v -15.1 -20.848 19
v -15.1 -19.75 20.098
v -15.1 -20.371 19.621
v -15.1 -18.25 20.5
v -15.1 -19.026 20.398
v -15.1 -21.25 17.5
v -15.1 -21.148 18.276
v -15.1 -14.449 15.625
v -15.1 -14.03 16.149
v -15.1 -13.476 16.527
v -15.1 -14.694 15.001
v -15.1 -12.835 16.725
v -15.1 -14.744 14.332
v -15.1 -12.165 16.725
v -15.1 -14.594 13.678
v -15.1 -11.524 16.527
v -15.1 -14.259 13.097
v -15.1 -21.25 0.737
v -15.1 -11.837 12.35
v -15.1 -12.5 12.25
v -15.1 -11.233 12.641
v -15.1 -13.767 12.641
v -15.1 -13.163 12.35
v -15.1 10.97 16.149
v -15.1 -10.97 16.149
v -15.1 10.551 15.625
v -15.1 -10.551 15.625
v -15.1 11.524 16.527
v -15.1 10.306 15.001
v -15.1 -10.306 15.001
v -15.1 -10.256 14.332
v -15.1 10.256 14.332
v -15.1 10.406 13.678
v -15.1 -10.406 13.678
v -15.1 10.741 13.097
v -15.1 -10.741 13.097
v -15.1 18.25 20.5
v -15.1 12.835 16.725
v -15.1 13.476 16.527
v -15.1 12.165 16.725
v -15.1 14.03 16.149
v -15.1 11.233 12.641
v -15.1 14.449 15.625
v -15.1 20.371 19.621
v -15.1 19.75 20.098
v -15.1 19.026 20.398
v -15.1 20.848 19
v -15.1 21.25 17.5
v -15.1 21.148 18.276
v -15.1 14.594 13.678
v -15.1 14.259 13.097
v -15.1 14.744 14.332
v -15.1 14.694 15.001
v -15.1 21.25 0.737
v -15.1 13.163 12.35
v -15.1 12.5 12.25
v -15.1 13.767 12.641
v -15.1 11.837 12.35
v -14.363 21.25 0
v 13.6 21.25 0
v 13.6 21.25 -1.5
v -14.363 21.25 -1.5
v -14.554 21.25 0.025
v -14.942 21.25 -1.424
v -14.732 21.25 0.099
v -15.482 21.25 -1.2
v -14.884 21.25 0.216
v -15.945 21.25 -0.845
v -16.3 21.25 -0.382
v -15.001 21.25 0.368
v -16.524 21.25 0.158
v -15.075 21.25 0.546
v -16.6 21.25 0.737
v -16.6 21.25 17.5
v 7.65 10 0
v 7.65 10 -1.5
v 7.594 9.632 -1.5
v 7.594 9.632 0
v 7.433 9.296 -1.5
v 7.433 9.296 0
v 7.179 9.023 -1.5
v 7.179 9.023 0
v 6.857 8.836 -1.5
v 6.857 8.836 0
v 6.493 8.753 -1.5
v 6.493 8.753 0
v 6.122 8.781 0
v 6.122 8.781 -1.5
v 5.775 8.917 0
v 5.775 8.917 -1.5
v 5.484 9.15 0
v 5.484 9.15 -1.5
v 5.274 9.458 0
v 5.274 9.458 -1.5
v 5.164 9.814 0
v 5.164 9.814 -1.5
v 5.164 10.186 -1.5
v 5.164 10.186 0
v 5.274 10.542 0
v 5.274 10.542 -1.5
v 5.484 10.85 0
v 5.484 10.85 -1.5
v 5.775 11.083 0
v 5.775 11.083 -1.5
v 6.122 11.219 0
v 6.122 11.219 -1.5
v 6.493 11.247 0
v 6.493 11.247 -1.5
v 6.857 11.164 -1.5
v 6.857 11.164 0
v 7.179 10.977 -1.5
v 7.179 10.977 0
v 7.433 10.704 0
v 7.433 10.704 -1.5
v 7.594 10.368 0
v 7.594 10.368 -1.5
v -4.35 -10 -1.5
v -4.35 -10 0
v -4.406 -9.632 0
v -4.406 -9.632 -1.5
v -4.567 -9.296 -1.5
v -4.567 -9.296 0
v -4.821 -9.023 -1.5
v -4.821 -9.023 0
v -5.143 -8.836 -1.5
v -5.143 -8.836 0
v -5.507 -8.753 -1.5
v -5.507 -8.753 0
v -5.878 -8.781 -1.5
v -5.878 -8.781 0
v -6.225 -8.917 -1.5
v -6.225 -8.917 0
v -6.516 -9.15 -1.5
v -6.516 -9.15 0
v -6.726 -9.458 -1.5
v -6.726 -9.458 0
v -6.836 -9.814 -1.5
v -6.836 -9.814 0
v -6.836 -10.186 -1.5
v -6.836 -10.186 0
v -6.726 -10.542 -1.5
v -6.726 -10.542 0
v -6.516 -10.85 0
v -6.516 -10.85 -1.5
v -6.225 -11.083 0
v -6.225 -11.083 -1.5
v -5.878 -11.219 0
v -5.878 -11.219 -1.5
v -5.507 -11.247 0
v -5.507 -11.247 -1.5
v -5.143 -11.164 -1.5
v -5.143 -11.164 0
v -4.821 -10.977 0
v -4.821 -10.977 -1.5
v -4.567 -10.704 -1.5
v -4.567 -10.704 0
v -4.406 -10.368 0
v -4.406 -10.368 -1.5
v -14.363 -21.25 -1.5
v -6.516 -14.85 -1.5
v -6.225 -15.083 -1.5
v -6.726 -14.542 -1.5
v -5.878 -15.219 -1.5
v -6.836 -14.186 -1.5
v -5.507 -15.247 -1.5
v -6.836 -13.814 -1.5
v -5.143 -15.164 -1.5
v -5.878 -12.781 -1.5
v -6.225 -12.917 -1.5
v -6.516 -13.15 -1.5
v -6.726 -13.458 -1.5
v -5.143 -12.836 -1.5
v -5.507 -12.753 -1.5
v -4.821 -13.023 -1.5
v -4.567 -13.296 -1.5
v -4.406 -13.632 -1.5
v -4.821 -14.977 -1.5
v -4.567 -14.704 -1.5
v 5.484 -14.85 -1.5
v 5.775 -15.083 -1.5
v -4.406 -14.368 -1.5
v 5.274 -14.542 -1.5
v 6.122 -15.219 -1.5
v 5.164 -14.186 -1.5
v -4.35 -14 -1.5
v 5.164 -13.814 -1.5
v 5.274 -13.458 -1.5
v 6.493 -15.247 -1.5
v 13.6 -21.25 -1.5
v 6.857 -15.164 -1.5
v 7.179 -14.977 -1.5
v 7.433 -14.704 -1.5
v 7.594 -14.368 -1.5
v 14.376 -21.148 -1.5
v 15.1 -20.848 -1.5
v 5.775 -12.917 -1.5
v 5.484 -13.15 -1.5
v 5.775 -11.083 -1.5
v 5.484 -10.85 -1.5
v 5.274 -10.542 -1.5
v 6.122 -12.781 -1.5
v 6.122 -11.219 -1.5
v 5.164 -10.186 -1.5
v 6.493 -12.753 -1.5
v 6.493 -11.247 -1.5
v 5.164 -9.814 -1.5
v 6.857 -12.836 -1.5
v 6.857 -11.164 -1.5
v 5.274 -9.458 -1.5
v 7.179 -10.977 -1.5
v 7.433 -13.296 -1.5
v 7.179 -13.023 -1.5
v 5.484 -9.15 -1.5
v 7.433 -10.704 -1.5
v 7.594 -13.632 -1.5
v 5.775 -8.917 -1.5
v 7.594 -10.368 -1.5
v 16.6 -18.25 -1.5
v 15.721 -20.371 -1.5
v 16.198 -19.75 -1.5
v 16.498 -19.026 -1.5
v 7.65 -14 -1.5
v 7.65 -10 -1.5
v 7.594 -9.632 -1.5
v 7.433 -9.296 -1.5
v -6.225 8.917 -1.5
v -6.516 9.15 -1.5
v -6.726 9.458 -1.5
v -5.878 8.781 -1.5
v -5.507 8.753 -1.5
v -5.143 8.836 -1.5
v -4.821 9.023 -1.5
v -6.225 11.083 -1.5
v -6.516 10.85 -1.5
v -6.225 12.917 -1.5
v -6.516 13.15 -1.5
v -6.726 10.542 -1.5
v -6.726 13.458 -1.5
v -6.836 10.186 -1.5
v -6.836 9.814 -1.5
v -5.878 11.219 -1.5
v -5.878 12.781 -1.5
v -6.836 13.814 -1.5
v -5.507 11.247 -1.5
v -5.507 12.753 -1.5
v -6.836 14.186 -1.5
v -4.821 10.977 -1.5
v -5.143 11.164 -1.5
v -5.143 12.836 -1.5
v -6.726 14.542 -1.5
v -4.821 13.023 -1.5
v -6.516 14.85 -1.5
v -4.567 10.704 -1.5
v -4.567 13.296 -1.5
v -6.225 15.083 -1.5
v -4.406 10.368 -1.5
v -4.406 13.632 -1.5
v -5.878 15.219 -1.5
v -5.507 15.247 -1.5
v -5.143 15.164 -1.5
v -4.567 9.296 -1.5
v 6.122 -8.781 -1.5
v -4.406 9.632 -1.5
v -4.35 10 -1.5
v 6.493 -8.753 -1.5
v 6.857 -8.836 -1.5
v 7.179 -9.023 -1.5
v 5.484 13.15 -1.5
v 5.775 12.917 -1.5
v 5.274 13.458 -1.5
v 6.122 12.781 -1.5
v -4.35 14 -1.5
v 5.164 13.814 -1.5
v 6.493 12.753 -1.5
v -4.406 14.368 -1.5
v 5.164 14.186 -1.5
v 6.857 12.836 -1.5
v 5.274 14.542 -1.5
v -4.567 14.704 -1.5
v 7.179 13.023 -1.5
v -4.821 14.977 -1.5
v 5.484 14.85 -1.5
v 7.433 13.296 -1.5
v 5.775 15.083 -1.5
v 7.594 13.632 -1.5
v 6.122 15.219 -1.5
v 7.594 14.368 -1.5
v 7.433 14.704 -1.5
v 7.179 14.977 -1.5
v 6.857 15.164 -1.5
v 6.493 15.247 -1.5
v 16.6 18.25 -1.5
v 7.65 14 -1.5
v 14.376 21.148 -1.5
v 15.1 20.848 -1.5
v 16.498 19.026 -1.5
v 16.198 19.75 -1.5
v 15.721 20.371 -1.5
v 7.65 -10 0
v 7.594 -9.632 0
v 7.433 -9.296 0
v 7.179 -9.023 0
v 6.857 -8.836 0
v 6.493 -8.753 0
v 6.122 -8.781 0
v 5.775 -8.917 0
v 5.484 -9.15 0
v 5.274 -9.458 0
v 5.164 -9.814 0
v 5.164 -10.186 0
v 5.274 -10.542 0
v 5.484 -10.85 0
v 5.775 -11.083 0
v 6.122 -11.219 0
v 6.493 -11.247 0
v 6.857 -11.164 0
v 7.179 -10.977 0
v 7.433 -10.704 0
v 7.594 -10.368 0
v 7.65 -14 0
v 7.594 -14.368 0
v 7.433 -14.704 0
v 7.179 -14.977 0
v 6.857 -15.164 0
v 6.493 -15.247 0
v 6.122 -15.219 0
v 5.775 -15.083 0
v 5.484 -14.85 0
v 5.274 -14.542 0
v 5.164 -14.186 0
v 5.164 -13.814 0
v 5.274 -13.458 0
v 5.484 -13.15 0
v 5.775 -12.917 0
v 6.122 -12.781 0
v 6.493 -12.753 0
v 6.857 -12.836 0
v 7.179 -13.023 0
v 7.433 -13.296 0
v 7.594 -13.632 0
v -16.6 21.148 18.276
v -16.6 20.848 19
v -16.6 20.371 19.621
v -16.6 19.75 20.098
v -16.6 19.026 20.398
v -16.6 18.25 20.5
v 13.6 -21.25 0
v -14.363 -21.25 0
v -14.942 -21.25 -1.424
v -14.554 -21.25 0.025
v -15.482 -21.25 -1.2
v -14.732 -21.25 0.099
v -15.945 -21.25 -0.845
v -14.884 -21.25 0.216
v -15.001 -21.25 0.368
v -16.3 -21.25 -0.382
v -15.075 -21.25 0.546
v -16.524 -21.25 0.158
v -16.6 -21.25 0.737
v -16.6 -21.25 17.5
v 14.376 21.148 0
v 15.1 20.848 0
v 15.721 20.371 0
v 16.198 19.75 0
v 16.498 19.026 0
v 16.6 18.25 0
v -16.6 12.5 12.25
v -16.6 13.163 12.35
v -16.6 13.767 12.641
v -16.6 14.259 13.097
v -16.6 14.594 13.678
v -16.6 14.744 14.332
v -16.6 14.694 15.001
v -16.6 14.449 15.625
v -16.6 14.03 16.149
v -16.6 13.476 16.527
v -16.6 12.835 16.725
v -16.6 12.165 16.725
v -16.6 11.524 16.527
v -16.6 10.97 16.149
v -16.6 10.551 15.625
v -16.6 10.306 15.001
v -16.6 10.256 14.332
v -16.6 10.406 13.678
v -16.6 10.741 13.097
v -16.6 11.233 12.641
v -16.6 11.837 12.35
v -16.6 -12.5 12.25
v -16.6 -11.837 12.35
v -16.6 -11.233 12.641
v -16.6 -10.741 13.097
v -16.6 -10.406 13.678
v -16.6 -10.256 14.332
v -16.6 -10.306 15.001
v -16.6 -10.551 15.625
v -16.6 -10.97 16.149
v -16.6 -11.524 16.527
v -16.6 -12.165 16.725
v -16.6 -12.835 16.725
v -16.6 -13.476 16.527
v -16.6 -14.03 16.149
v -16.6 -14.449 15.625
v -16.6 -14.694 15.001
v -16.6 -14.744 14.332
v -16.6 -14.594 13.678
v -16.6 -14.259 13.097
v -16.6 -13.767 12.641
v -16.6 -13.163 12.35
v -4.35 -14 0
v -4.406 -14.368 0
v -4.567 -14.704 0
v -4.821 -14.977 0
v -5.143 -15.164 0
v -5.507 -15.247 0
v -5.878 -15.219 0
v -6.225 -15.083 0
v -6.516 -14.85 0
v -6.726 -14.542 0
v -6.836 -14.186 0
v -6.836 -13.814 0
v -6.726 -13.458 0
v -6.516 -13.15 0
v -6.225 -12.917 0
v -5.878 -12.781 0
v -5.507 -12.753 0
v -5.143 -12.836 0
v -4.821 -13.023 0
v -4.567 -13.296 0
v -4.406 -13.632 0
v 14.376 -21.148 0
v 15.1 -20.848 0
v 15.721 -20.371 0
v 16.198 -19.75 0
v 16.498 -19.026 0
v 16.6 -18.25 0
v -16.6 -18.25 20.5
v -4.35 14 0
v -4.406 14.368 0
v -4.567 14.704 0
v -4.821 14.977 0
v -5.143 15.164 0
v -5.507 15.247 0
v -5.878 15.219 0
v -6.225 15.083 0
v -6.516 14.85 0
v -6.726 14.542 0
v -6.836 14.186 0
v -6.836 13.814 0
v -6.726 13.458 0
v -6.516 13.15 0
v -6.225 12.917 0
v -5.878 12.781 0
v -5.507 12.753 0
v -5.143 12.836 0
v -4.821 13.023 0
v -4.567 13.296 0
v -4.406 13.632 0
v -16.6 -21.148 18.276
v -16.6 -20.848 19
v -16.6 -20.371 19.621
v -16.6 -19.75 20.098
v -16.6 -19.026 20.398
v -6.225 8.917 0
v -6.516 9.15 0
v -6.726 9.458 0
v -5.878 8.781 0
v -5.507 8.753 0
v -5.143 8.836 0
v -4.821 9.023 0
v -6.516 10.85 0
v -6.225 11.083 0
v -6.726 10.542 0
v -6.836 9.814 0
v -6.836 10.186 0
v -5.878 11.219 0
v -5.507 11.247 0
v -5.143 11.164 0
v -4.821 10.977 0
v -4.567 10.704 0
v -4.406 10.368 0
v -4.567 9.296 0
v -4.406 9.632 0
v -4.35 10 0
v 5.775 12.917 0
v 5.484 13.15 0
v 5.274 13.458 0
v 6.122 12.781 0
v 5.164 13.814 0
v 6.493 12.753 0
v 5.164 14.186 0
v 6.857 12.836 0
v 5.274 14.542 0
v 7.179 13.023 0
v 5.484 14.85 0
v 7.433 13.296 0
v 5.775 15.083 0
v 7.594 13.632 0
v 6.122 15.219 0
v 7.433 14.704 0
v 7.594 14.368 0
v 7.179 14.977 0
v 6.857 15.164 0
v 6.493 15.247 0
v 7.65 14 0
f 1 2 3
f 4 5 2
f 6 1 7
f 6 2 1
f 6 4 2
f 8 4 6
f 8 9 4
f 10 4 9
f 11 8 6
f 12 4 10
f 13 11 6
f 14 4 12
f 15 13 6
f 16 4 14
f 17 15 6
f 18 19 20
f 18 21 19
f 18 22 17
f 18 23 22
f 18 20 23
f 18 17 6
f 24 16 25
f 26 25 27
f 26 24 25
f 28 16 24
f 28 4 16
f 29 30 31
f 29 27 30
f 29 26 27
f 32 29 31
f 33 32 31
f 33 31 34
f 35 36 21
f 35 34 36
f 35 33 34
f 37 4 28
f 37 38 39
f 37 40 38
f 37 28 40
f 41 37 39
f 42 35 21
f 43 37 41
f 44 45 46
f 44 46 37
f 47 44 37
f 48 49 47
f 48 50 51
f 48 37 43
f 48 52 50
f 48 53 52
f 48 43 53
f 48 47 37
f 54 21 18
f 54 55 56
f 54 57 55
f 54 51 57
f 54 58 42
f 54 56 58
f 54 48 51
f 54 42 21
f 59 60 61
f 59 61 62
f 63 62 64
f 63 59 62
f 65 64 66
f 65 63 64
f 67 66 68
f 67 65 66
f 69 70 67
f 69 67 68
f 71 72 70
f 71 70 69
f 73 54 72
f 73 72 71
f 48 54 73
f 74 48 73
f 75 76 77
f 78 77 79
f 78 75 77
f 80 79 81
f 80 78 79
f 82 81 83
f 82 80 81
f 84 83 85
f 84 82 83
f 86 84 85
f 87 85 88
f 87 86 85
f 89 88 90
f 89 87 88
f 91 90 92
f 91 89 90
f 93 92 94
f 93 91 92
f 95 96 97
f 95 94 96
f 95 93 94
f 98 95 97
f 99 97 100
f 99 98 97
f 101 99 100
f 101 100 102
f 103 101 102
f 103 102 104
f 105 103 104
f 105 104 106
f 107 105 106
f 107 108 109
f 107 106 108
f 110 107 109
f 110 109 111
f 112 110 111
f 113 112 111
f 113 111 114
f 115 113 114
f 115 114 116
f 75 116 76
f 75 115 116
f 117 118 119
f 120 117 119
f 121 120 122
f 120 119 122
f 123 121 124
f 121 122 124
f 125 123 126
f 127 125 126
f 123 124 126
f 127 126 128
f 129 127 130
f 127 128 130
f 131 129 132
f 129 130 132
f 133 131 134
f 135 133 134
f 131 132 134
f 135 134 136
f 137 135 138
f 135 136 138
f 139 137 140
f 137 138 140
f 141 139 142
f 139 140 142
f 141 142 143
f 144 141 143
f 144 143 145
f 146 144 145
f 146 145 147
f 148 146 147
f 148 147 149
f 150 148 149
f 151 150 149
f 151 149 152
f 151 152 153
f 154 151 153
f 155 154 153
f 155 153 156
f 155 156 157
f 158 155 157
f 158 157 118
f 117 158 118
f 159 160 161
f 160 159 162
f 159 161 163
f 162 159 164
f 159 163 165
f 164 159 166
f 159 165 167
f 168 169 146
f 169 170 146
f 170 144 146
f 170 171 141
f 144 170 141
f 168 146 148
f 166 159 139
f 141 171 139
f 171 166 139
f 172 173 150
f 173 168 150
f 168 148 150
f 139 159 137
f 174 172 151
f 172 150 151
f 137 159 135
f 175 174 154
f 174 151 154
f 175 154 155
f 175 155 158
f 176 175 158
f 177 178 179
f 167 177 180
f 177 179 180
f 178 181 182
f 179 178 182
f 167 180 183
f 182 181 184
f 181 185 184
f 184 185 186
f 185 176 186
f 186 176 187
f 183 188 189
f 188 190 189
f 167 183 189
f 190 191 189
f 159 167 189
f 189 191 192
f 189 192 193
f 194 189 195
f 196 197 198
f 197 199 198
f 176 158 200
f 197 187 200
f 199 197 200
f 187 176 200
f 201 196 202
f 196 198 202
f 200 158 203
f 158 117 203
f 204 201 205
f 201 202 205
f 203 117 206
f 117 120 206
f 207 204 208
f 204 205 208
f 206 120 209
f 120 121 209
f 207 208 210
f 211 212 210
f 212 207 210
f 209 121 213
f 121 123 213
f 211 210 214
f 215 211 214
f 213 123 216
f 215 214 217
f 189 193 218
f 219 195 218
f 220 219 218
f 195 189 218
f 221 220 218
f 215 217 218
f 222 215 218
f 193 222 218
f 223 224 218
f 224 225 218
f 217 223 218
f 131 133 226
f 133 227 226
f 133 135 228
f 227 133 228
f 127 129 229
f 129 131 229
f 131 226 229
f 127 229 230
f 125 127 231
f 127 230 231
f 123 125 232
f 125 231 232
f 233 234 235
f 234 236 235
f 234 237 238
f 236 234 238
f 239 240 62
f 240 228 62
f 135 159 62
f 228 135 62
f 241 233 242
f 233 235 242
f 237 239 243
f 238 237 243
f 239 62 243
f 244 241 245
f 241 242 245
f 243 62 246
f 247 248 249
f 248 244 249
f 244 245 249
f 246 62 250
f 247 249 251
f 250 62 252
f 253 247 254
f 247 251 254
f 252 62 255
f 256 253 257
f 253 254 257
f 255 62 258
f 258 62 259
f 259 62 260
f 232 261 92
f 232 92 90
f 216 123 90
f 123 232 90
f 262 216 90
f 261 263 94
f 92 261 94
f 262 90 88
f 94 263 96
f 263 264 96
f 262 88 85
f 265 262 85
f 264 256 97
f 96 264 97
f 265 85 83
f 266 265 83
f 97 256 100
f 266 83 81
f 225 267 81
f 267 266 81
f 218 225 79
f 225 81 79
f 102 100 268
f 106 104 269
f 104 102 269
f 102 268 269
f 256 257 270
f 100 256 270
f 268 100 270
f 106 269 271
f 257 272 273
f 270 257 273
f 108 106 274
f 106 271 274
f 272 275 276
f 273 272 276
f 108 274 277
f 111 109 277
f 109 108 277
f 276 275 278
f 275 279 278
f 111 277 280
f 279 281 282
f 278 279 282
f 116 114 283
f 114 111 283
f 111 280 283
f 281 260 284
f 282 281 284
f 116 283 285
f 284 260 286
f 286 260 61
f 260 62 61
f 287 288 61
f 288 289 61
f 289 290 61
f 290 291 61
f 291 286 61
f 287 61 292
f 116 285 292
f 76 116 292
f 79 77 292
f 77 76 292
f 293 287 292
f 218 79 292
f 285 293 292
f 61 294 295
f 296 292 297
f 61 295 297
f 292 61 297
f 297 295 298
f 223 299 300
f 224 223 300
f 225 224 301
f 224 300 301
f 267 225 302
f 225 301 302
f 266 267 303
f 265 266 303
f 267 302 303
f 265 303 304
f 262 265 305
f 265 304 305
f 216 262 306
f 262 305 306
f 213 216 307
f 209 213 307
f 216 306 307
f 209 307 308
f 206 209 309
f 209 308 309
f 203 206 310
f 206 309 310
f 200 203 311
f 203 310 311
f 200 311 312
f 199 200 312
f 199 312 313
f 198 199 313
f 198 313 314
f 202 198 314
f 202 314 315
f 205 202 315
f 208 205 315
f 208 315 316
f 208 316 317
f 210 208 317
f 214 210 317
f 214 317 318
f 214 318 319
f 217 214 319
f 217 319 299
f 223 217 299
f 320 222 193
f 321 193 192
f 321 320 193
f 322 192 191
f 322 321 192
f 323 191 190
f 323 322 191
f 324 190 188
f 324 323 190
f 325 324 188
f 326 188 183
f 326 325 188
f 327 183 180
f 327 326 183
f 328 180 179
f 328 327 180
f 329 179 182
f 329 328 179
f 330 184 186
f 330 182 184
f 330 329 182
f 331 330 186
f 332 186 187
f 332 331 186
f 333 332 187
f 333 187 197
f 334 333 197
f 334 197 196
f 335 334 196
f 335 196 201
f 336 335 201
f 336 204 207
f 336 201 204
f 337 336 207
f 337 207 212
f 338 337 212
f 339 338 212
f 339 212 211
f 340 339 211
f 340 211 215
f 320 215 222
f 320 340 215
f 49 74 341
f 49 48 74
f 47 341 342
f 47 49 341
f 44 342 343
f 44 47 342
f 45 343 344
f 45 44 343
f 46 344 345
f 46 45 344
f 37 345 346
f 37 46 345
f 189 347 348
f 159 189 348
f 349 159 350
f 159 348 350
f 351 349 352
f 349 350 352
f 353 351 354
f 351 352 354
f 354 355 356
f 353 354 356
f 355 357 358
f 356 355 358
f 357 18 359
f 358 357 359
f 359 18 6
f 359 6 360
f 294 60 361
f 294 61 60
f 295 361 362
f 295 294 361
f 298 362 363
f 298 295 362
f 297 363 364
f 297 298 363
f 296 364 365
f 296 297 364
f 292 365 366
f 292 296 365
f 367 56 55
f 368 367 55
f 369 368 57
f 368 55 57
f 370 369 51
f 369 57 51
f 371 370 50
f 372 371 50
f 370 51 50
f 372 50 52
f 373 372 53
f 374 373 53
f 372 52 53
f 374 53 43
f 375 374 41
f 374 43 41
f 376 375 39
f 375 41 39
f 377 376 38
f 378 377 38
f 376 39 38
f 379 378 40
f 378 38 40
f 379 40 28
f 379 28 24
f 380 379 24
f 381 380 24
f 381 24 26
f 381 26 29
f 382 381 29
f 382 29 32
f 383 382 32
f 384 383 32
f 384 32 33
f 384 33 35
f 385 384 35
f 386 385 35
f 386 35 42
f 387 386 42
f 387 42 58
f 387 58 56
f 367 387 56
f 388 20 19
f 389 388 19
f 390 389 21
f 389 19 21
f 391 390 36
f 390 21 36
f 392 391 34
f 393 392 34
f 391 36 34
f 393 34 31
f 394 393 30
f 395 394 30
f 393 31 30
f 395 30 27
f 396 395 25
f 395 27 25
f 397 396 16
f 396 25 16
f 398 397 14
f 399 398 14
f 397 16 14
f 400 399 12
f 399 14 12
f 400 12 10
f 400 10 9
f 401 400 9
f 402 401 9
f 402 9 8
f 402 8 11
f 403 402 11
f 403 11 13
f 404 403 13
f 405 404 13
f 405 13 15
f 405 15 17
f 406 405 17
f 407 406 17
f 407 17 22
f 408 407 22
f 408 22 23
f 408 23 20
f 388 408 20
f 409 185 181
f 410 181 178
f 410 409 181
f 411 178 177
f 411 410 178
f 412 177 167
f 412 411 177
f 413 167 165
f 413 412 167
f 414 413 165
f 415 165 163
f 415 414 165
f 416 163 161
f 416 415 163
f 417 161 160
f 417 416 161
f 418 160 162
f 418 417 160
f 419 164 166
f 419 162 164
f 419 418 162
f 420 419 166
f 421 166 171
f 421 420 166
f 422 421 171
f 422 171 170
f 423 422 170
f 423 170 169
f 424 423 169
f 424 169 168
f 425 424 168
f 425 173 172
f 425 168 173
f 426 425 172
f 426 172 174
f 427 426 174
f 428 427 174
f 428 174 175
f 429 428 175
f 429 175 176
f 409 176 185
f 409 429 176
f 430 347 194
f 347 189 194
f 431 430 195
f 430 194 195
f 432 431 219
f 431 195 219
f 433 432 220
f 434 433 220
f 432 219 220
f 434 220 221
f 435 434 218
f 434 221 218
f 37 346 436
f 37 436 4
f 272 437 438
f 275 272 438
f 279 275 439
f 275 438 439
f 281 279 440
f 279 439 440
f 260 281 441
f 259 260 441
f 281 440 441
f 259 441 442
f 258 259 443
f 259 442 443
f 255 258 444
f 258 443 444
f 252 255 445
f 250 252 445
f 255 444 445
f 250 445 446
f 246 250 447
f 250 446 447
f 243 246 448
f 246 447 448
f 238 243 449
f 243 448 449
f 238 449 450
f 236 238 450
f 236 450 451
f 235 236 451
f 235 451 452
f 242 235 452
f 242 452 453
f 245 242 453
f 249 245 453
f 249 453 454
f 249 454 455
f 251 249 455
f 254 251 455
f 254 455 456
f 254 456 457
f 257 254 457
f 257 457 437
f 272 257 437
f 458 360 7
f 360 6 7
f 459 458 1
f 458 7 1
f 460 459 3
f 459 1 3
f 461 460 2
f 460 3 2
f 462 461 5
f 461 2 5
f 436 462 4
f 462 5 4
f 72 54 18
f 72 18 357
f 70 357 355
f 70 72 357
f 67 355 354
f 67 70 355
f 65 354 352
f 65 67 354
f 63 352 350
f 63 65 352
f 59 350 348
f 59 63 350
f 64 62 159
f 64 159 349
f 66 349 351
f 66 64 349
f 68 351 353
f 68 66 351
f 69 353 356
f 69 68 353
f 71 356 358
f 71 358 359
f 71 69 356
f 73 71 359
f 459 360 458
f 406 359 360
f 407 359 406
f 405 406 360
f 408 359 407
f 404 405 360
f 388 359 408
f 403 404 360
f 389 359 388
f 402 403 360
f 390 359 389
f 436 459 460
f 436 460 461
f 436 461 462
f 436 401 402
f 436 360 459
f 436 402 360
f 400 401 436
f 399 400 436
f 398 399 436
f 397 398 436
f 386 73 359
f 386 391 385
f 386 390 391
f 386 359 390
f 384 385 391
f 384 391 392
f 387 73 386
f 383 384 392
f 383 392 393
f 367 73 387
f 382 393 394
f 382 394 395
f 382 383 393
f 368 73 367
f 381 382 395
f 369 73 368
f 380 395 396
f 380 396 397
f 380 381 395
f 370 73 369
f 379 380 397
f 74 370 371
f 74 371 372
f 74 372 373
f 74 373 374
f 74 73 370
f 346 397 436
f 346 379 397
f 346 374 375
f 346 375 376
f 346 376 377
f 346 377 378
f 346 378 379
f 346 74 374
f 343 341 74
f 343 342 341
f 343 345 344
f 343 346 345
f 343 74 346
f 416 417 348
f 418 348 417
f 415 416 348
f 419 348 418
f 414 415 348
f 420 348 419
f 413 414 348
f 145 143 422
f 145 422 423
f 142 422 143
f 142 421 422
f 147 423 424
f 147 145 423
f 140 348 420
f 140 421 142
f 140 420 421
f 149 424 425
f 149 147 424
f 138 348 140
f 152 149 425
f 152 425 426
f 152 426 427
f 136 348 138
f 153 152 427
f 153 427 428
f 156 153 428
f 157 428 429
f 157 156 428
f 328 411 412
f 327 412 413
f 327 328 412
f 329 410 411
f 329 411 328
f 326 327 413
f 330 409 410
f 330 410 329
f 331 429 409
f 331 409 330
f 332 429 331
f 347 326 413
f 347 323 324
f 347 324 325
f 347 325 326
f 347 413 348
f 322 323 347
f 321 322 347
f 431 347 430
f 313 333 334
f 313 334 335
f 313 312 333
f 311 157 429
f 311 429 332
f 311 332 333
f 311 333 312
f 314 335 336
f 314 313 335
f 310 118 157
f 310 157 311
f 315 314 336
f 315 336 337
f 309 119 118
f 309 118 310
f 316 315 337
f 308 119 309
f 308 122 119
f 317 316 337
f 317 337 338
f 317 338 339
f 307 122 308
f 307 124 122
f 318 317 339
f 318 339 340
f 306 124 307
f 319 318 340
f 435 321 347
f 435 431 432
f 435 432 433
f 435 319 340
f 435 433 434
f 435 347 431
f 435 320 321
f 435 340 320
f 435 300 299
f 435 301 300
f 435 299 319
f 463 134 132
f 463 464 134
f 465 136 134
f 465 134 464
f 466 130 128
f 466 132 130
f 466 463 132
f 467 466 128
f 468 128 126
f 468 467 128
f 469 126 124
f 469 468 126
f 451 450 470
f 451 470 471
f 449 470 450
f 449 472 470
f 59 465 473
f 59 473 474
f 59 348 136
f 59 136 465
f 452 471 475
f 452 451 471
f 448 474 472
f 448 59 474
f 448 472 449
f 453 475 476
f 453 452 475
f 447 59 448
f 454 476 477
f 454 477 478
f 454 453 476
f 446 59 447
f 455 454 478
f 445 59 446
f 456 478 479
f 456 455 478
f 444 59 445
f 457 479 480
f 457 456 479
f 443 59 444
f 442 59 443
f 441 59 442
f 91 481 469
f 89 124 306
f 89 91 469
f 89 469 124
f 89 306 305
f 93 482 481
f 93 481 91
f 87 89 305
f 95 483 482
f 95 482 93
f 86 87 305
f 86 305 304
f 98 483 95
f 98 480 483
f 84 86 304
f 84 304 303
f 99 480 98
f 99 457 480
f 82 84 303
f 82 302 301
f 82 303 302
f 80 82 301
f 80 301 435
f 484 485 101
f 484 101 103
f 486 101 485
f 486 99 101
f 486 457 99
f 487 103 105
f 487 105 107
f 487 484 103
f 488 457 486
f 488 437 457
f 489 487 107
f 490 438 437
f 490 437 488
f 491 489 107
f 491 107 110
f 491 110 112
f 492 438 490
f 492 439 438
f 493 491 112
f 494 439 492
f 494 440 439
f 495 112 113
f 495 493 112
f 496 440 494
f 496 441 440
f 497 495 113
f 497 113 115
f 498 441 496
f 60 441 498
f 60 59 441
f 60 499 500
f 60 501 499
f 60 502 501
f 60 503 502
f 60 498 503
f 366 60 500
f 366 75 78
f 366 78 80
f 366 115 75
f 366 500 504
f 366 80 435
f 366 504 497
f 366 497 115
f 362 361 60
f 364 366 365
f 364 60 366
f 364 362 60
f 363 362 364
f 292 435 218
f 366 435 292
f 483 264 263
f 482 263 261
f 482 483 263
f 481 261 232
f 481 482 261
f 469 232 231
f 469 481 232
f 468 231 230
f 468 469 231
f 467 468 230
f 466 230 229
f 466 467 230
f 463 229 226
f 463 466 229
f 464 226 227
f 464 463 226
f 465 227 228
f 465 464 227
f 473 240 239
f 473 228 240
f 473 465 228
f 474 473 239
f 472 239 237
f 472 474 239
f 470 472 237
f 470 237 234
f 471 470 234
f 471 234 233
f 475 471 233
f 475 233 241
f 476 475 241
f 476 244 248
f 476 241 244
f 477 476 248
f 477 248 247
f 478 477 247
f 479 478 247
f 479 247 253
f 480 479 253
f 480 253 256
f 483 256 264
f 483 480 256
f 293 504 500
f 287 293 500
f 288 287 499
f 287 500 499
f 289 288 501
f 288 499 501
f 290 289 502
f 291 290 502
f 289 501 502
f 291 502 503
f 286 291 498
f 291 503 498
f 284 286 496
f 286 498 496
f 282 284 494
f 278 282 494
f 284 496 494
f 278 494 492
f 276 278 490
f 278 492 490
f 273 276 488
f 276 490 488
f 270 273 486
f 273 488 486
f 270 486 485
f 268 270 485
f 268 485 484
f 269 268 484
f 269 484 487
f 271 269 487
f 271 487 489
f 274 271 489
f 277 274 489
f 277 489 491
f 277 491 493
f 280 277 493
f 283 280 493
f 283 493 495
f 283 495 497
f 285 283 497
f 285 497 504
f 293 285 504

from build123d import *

# Parameters (mm, degrees)
SKETCH_1_W                       = 33.2
SKETCH_1_H                       = 42.5
SM_BASE_FLANGE_1_DEPTH           = 1.5
SM_EDGE_FLANGE_1_STRIP_W         = 7.4732
SM_EDGE_FLANGE_1_STRIP_H         = 1.5
SM_EDGE_FLANGE_1_STRIP_CUT_DEPTH = 42.5
SM_EDGE_FLANGE_1_DEPTH           = 42.5
SKETCH_9_R                       = 1.25
CUT_EXTRUDE_1_DEPTH              = 10
SKETCH_10_R                      = 2.25
CUT_EXTRUDE_2_DEPTH              = 10
FILLET_1_R                       = 3


# Sheet-metal steps are written as plain solids
with BuildPart() as part:
    # Sketch 1 → 基体-法兰1 (new body)
    with BuildSketch(Plane.XY):
        Rectangle(SKETCH_1_W, SKETCH_1_H)
    extrude(amount=-SM_BASE_FLANGE_1_DEPTH)

    # 边线-法兰1 strip (across the edge) → 边线-法兰1 strip cut (cut)
    with BuildSketch(Plane(origin=(-16.6, 21.25, 0), x_dir=(1, 0, 0), z_dir=(0, -1, 0))):
        with Locations((-1.5, -0.75)):
            Rectangle(SM_EDGE_FLANGE_1_STRIP_W, SM_EDGE_FLANGE_1_STRIP_H)
    extrude(amount=SM_EDGE_FLANGE_1_STRIP_CUT_DEPTH, mode=Mode.SUBTRACT)

    # 边线-法兰1 section (across the edge) → 边线-法兰1 (add)
    with BuildSketch(Plane(origin=(-16.6, 21.25, 0), x_dir=(1, 0, 0), z_dir=(0, -1, 0))):
        with BuildLine():
            Line((0, 0.7366), (0, 20.5))
            Line((0, 20.5), (1.5, 20.5))
            Line((1.5, 20.5), (1.5, 0.7366))
            ThreePointArc((1.5, 0.7366), (1.715745145, 0.215745145), (2.2366, 0))
            Line((2.2366, 0), (2.2366, -1.5))
            ThreePointArc((2.2366, -1.5), (0.655084973, -0.844915027), (0, 0.7366))
        make_face()
    extrude(amount=SM_EDGE_FLANGE_1_DEPTH)

    # 草图9 → 切除-拉伸1 (cut)
    with BuildSketch(Plane.XY):
        with Locations((6.4, 14)):
            Circle(SKETCH_9_R)
        with Locations((-5.6, 14)):
            Circle(SKETCH_9_R)
        with Locations((6.4, -10)):
            Circle(SKETCH_9_R)
        with Locations((-5.6, -10)):
            Circle(SKETCH_9_R)
    cut_extrude_1 = extrude(amount=-CUT_EXTRUDE_1_DEPTH, mode=Mode.SUBTRACT)

    # 草图10 → 切除-拉伸2 (cut)
    with BuildSketch(Plane(origin=(-15.1, 0, 0), x_dir=(0, 0, -1), z_dir=(1, 0, 0))):
        with Locations((-14.5, 12.5)):
            Circle(SKETCH_10_R)
        with Locations((-14.5, -12.5)):
            Circle(SKETCH_10_R)
    extrude(amount=-CUT_EXTRUDE_2_DEPTH, mode=Mode.SUBTRACT)

    # 镜向1: 切除-拉伸1 across plane
    add(cut_extrude_1.mirror(Plane.ZX), mode=Mode.SUBTRACT)

    # 圆角1
    fillet_1_edges = [part.edges().sort_by_distance(p)[0] for p in [
        (-15.85, 21.25, 20.5),
        (-15.85, -21.25, 20.5),
        (16.6, 21.25, -0.75),
        (16.6, -21.25, -0.75),
    ]]
    fillet(fillet_1_edges, radius=FILLET_1_R)


solid = part.part
